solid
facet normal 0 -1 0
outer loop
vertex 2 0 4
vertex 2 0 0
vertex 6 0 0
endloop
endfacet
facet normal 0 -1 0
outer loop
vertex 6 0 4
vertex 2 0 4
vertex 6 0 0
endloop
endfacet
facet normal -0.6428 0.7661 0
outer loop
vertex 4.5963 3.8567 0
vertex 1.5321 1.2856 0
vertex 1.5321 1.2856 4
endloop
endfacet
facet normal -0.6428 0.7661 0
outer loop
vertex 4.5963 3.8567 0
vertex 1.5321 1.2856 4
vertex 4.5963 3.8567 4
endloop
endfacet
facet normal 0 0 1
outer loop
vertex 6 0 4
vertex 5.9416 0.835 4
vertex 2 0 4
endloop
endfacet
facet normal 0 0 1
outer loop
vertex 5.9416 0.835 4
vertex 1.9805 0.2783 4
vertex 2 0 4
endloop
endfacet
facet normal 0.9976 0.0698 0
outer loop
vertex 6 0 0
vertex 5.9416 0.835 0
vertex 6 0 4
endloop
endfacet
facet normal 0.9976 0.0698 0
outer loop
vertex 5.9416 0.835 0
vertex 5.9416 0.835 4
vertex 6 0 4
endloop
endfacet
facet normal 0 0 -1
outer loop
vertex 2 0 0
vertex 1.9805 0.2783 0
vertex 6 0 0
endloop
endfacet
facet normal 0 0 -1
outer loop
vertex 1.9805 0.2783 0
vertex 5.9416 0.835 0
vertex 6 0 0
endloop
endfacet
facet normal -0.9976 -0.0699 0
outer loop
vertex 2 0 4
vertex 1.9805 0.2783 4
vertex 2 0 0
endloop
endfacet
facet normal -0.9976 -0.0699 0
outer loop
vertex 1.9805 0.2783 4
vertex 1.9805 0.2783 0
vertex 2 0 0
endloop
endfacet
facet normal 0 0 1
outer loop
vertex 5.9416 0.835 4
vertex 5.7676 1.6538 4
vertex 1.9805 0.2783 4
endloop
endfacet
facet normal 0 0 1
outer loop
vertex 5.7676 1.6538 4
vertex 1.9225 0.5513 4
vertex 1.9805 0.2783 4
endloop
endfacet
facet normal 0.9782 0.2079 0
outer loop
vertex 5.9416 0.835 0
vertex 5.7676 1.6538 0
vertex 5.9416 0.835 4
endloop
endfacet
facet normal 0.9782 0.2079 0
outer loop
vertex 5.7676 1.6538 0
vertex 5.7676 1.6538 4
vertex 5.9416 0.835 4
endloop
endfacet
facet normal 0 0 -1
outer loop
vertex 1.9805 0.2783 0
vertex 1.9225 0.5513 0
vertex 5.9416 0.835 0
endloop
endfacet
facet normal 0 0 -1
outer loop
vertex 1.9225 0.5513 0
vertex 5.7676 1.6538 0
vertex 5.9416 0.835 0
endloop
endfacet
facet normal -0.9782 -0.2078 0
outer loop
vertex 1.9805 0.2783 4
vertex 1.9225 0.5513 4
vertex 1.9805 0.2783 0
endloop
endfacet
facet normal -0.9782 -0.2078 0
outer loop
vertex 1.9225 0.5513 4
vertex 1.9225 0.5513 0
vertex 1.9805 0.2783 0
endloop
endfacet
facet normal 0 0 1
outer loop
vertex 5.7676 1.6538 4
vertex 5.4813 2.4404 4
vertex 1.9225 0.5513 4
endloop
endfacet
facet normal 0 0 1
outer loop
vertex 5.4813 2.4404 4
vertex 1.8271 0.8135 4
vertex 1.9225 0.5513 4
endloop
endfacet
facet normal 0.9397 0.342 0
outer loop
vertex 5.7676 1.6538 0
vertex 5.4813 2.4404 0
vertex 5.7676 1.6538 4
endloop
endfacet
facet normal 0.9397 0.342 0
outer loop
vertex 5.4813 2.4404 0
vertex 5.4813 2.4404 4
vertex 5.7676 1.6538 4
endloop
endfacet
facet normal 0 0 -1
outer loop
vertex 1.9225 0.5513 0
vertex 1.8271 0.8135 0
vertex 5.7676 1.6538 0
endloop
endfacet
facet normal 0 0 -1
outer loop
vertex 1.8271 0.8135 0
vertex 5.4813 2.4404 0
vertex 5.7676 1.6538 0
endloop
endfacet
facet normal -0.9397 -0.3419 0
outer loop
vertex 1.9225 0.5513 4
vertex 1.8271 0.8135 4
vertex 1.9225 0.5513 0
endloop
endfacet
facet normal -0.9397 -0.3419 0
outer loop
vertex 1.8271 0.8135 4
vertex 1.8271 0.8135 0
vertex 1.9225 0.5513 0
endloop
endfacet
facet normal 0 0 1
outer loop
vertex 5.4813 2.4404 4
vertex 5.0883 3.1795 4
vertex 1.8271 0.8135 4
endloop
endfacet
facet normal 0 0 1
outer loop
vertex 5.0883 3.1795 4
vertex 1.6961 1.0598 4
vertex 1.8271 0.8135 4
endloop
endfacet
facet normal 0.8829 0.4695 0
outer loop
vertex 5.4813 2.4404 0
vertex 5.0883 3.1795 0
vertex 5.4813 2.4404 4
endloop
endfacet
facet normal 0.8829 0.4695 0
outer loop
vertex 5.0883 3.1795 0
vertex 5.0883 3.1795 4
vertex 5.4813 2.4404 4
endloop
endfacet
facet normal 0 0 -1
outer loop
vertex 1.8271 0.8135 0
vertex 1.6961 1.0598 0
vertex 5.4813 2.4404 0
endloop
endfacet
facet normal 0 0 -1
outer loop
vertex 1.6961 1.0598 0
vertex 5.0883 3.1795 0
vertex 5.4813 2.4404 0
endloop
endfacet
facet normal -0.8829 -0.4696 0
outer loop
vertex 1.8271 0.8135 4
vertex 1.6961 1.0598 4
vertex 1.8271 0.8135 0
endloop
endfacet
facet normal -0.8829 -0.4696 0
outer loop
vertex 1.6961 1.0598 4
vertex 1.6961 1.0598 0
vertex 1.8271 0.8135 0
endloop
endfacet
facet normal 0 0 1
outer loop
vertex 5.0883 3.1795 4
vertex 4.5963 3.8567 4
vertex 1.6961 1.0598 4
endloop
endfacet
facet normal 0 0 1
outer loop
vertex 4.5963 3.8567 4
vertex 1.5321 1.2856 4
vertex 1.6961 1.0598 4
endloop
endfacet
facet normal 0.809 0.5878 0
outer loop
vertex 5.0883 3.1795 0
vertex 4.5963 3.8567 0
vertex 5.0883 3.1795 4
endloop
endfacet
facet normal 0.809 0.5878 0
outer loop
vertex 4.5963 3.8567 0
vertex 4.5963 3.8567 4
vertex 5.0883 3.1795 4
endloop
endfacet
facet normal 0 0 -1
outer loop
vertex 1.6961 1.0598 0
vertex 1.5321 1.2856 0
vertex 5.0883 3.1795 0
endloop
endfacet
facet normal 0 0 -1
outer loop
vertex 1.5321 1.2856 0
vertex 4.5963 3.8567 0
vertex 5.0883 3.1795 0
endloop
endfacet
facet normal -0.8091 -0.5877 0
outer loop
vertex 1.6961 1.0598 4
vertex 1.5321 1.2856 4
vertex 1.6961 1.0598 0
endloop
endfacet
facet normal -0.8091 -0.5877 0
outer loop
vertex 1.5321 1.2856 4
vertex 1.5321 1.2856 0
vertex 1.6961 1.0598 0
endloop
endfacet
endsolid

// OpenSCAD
rotate_extrude(angle=40, $fn=50) translate([2,0,0]) square([4, 4]);
